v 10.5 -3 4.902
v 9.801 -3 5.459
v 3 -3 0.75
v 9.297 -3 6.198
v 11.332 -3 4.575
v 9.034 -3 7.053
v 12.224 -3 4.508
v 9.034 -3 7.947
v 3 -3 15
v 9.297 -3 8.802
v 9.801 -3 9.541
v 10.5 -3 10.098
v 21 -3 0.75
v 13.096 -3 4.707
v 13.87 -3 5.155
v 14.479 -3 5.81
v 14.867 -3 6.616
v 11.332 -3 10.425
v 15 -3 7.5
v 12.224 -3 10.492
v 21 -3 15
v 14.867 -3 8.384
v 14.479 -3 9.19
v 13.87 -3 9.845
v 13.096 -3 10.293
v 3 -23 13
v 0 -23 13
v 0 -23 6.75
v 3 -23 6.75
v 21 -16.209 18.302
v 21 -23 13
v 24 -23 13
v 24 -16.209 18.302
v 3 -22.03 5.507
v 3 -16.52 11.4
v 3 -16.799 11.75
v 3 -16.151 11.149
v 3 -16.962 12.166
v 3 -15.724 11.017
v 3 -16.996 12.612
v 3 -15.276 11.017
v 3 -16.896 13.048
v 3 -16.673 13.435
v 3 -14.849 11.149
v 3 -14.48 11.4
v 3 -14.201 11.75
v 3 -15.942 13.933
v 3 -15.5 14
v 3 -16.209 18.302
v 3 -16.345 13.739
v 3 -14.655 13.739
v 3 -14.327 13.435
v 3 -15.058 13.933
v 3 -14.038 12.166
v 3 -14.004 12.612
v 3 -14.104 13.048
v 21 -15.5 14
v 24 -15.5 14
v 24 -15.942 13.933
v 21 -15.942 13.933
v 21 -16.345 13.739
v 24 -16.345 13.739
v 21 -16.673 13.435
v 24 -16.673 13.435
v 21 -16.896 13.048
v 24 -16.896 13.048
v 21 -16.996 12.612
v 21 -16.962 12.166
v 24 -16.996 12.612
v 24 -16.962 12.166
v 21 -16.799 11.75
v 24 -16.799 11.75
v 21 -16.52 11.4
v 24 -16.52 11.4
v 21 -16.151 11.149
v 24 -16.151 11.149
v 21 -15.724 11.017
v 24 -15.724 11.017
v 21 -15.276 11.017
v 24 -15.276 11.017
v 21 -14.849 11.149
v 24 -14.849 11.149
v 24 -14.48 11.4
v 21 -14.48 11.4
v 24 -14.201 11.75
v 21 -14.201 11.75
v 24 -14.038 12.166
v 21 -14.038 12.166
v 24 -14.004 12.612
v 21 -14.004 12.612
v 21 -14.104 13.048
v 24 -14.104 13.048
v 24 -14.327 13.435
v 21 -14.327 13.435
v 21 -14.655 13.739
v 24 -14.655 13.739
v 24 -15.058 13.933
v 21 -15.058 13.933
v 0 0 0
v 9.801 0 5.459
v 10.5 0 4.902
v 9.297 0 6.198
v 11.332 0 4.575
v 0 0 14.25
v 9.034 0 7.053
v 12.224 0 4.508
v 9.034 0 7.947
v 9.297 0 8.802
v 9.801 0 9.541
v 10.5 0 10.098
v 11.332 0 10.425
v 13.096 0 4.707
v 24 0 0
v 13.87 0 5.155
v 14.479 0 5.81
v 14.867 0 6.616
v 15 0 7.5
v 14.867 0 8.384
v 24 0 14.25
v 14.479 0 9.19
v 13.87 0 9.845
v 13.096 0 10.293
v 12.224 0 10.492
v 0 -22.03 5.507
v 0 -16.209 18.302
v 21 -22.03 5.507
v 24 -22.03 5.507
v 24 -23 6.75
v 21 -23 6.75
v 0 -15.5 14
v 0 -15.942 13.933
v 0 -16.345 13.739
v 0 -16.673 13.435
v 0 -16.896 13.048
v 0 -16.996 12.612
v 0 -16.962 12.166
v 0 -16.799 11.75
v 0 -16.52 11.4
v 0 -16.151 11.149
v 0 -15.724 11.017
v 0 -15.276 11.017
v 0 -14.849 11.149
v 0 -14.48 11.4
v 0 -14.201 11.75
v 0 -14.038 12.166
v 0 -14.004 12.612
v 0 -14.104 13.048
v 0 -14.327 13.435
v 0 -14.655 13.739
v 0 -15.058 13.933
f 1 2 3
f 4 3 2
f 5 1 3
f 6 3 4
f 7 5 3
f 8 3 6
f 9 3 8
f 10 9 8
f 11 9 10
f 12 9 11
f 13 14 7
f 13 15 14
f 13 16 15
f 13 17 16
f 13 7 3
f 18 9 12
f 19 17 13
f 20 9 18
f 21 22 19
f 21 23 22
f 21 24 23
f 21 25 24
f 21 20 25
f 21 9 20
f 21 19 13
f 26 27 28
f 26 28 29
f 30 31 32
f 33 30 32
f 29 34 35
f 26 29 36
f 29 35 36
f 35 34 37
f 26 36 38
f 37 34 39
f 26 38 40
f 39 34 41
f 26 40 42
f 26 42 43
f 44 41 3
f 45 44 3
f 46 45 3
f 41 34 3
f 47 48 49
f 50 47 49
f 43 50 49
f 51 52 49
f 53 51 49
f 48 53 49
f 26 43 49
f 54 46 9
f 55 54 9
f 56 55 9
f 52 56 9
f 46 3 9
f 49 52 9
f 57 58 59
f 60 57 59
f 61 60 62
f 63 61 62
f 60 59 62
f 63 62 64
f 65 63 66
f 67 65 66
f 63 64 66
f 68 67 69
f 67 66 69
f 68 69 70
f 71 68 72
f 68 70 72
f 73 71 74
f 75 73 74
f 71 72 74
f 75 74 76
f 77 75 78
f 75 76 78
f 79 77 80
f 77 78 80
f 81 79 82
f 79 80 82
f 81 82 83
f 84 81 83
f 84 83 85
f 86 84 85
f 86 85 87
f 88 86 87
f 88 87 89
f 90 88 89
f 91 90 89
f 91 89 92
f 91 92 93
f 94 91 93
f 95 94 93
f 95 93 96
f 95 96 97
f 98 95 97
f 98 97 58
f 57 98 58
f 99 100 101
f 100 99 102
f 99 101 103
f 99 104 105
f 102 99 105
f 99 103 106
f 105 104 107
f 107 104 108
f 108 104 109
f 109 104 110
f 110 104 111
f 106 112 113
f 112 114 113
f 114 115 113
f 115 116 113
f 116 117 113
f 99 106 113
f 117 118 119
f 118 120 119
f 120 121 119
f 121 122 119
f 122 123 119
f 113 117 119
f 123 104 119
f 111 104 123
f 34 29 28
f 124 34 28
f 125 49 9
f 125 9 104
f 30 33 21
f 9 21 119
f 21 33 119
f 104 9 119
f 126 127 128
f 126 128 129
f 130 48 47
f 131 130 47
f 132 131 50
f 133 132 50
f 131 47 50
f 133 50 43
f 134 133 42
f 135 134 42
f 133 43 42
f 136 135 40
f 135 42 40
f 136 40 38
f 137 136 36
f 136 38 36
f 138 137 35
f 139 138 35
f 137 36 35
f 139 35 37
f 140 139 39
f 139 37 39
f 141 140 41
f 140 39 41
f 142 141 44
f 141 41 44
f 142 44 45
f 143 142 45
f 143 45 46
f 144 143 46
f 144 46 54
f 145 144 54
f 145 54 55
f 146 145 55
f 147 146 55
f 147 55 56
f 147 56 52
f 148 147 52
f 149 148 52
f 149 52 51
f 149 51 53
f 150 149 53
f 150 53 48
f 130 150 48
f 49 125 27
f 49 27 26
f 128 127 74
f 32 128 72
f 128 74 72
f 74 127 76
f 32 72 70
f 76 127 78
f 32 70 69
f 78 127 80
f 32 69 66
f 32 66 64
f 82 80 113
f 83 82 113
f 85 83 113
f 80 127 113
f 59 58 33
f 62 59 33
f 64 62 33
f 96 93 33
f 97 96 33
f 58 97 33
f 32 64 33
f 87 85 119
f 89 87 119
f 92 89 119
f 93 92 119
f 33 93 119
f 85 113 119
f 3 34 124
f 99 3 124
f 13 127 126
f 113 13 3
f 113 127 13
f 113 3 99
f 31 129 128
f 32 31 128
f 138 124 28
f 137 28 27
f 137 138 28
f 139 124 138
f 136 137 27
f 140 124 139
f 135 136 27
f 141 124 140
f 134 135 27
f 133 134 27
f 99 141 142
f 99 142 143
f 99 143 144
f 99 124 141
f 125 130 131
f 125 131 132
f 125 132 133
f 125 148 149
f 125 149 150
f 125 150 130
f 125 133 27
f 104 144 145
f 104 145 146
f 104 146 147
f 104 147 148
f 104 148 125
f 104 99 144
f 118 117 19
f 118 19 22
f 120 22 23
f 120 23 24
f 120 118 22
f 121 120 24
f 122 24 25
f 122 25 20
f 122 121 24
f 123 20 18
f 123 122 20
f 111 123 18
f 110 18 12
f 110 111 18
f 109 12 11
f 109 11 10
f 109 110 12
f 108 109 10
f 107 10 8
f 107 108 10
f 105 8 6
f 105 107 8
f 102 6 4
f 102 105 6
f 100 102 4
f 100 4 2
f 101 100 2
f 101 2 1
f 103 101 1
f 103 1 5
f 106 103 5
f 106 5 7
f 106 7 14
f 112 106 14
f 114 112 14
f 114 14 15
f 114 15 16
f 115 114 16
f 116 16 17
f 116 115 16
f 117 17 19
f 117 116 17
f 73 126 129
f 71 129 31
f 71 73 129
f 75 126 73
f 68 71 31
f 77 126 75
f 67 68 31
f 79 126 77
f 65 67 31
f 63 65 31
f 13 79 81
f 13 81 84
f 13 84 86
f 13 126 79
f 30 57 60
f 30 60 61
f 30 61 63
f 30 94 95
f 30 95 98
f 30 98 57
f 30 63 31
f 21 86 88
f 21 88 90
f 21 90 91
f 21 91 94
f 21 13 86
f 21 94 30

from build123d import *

# Parameters (mm, degrees)
SKETCH_W        = 24
SKETCH_H        = 15
SKETCH_R        = 3
PAD_DEPTH       = 3
SKETCH001_W     = 3
SKETCH001_H     = 20
PAD001_DEPTH    = 20
SKETCH002_R     = 1.5
POCKET_DEPTH    = 24.001
CHAMFER_SIZE    = 7
CHAMFER001_SIZE = 1


with BuildPart() as part:
    # Sketch → Pad (new body)
    with BuildSketch(Plane.XZ):
        with Locations((12, 7.5)):
            Rectangle(SKETCH_W, SKETCH_H)
        with Locations((12, 7.5)):
            Circle(SKETCH_R, mode=Mode.SUBTRACT)
    extrude(amount=PAD_DEPTH)

    # Sketch001 (on Face7 of Pad) → Pad001 (join)
    with BuildSketch(Plane.XZ.offset(3)):
        with Locations((22.5, 10)):
            Rectangle(SKETCH001_W, SKETCH001_H)
        with Locations((1.5, 10)):
            Rectangle(SKETCH001_W, SKETCH001_H)
    extrude(amount=PAD001_DEPTH)

    # Sketch002 (on Face10 of Pad001) → Pocket (cut, through all)
    with BuildSketch(Plane(origin=(24, 0, 0), x_dir=(0, 0, 1), z_dir=(1, 0, 0))):
        with Locations((12.5, 15.5)):
            Circle(SKETCH002_R)
        Polygon((20, 23), (14.25, 0), (20, 0), align=None)
        Polygon((0, 23), (5.75, 23), (0, 0), align=None)
    extrude(amount=-POCKET_DEPTH, mode=Mode.SUBTRACT)

    # Chamfer
    chamfer_edges = [part.edges().sort_by_distance(p)[0] for p in [
        (1.5, -23, 20),
        (22.5, -23, 20),
    ]]
    chamfer(chamfer_edges, length=CHAMFER_SIZE)

    # Chamfer001
    chamfer001_edges = [part.edges().sort_by_distance(p)[0] for p in [
        (22.5, -23, 5.75),
        (1.5, -23, 5.75),
    ]]
    chamfer(chamfer001_edges, length=CHAMFER001_SIZE)


solid = part.part
